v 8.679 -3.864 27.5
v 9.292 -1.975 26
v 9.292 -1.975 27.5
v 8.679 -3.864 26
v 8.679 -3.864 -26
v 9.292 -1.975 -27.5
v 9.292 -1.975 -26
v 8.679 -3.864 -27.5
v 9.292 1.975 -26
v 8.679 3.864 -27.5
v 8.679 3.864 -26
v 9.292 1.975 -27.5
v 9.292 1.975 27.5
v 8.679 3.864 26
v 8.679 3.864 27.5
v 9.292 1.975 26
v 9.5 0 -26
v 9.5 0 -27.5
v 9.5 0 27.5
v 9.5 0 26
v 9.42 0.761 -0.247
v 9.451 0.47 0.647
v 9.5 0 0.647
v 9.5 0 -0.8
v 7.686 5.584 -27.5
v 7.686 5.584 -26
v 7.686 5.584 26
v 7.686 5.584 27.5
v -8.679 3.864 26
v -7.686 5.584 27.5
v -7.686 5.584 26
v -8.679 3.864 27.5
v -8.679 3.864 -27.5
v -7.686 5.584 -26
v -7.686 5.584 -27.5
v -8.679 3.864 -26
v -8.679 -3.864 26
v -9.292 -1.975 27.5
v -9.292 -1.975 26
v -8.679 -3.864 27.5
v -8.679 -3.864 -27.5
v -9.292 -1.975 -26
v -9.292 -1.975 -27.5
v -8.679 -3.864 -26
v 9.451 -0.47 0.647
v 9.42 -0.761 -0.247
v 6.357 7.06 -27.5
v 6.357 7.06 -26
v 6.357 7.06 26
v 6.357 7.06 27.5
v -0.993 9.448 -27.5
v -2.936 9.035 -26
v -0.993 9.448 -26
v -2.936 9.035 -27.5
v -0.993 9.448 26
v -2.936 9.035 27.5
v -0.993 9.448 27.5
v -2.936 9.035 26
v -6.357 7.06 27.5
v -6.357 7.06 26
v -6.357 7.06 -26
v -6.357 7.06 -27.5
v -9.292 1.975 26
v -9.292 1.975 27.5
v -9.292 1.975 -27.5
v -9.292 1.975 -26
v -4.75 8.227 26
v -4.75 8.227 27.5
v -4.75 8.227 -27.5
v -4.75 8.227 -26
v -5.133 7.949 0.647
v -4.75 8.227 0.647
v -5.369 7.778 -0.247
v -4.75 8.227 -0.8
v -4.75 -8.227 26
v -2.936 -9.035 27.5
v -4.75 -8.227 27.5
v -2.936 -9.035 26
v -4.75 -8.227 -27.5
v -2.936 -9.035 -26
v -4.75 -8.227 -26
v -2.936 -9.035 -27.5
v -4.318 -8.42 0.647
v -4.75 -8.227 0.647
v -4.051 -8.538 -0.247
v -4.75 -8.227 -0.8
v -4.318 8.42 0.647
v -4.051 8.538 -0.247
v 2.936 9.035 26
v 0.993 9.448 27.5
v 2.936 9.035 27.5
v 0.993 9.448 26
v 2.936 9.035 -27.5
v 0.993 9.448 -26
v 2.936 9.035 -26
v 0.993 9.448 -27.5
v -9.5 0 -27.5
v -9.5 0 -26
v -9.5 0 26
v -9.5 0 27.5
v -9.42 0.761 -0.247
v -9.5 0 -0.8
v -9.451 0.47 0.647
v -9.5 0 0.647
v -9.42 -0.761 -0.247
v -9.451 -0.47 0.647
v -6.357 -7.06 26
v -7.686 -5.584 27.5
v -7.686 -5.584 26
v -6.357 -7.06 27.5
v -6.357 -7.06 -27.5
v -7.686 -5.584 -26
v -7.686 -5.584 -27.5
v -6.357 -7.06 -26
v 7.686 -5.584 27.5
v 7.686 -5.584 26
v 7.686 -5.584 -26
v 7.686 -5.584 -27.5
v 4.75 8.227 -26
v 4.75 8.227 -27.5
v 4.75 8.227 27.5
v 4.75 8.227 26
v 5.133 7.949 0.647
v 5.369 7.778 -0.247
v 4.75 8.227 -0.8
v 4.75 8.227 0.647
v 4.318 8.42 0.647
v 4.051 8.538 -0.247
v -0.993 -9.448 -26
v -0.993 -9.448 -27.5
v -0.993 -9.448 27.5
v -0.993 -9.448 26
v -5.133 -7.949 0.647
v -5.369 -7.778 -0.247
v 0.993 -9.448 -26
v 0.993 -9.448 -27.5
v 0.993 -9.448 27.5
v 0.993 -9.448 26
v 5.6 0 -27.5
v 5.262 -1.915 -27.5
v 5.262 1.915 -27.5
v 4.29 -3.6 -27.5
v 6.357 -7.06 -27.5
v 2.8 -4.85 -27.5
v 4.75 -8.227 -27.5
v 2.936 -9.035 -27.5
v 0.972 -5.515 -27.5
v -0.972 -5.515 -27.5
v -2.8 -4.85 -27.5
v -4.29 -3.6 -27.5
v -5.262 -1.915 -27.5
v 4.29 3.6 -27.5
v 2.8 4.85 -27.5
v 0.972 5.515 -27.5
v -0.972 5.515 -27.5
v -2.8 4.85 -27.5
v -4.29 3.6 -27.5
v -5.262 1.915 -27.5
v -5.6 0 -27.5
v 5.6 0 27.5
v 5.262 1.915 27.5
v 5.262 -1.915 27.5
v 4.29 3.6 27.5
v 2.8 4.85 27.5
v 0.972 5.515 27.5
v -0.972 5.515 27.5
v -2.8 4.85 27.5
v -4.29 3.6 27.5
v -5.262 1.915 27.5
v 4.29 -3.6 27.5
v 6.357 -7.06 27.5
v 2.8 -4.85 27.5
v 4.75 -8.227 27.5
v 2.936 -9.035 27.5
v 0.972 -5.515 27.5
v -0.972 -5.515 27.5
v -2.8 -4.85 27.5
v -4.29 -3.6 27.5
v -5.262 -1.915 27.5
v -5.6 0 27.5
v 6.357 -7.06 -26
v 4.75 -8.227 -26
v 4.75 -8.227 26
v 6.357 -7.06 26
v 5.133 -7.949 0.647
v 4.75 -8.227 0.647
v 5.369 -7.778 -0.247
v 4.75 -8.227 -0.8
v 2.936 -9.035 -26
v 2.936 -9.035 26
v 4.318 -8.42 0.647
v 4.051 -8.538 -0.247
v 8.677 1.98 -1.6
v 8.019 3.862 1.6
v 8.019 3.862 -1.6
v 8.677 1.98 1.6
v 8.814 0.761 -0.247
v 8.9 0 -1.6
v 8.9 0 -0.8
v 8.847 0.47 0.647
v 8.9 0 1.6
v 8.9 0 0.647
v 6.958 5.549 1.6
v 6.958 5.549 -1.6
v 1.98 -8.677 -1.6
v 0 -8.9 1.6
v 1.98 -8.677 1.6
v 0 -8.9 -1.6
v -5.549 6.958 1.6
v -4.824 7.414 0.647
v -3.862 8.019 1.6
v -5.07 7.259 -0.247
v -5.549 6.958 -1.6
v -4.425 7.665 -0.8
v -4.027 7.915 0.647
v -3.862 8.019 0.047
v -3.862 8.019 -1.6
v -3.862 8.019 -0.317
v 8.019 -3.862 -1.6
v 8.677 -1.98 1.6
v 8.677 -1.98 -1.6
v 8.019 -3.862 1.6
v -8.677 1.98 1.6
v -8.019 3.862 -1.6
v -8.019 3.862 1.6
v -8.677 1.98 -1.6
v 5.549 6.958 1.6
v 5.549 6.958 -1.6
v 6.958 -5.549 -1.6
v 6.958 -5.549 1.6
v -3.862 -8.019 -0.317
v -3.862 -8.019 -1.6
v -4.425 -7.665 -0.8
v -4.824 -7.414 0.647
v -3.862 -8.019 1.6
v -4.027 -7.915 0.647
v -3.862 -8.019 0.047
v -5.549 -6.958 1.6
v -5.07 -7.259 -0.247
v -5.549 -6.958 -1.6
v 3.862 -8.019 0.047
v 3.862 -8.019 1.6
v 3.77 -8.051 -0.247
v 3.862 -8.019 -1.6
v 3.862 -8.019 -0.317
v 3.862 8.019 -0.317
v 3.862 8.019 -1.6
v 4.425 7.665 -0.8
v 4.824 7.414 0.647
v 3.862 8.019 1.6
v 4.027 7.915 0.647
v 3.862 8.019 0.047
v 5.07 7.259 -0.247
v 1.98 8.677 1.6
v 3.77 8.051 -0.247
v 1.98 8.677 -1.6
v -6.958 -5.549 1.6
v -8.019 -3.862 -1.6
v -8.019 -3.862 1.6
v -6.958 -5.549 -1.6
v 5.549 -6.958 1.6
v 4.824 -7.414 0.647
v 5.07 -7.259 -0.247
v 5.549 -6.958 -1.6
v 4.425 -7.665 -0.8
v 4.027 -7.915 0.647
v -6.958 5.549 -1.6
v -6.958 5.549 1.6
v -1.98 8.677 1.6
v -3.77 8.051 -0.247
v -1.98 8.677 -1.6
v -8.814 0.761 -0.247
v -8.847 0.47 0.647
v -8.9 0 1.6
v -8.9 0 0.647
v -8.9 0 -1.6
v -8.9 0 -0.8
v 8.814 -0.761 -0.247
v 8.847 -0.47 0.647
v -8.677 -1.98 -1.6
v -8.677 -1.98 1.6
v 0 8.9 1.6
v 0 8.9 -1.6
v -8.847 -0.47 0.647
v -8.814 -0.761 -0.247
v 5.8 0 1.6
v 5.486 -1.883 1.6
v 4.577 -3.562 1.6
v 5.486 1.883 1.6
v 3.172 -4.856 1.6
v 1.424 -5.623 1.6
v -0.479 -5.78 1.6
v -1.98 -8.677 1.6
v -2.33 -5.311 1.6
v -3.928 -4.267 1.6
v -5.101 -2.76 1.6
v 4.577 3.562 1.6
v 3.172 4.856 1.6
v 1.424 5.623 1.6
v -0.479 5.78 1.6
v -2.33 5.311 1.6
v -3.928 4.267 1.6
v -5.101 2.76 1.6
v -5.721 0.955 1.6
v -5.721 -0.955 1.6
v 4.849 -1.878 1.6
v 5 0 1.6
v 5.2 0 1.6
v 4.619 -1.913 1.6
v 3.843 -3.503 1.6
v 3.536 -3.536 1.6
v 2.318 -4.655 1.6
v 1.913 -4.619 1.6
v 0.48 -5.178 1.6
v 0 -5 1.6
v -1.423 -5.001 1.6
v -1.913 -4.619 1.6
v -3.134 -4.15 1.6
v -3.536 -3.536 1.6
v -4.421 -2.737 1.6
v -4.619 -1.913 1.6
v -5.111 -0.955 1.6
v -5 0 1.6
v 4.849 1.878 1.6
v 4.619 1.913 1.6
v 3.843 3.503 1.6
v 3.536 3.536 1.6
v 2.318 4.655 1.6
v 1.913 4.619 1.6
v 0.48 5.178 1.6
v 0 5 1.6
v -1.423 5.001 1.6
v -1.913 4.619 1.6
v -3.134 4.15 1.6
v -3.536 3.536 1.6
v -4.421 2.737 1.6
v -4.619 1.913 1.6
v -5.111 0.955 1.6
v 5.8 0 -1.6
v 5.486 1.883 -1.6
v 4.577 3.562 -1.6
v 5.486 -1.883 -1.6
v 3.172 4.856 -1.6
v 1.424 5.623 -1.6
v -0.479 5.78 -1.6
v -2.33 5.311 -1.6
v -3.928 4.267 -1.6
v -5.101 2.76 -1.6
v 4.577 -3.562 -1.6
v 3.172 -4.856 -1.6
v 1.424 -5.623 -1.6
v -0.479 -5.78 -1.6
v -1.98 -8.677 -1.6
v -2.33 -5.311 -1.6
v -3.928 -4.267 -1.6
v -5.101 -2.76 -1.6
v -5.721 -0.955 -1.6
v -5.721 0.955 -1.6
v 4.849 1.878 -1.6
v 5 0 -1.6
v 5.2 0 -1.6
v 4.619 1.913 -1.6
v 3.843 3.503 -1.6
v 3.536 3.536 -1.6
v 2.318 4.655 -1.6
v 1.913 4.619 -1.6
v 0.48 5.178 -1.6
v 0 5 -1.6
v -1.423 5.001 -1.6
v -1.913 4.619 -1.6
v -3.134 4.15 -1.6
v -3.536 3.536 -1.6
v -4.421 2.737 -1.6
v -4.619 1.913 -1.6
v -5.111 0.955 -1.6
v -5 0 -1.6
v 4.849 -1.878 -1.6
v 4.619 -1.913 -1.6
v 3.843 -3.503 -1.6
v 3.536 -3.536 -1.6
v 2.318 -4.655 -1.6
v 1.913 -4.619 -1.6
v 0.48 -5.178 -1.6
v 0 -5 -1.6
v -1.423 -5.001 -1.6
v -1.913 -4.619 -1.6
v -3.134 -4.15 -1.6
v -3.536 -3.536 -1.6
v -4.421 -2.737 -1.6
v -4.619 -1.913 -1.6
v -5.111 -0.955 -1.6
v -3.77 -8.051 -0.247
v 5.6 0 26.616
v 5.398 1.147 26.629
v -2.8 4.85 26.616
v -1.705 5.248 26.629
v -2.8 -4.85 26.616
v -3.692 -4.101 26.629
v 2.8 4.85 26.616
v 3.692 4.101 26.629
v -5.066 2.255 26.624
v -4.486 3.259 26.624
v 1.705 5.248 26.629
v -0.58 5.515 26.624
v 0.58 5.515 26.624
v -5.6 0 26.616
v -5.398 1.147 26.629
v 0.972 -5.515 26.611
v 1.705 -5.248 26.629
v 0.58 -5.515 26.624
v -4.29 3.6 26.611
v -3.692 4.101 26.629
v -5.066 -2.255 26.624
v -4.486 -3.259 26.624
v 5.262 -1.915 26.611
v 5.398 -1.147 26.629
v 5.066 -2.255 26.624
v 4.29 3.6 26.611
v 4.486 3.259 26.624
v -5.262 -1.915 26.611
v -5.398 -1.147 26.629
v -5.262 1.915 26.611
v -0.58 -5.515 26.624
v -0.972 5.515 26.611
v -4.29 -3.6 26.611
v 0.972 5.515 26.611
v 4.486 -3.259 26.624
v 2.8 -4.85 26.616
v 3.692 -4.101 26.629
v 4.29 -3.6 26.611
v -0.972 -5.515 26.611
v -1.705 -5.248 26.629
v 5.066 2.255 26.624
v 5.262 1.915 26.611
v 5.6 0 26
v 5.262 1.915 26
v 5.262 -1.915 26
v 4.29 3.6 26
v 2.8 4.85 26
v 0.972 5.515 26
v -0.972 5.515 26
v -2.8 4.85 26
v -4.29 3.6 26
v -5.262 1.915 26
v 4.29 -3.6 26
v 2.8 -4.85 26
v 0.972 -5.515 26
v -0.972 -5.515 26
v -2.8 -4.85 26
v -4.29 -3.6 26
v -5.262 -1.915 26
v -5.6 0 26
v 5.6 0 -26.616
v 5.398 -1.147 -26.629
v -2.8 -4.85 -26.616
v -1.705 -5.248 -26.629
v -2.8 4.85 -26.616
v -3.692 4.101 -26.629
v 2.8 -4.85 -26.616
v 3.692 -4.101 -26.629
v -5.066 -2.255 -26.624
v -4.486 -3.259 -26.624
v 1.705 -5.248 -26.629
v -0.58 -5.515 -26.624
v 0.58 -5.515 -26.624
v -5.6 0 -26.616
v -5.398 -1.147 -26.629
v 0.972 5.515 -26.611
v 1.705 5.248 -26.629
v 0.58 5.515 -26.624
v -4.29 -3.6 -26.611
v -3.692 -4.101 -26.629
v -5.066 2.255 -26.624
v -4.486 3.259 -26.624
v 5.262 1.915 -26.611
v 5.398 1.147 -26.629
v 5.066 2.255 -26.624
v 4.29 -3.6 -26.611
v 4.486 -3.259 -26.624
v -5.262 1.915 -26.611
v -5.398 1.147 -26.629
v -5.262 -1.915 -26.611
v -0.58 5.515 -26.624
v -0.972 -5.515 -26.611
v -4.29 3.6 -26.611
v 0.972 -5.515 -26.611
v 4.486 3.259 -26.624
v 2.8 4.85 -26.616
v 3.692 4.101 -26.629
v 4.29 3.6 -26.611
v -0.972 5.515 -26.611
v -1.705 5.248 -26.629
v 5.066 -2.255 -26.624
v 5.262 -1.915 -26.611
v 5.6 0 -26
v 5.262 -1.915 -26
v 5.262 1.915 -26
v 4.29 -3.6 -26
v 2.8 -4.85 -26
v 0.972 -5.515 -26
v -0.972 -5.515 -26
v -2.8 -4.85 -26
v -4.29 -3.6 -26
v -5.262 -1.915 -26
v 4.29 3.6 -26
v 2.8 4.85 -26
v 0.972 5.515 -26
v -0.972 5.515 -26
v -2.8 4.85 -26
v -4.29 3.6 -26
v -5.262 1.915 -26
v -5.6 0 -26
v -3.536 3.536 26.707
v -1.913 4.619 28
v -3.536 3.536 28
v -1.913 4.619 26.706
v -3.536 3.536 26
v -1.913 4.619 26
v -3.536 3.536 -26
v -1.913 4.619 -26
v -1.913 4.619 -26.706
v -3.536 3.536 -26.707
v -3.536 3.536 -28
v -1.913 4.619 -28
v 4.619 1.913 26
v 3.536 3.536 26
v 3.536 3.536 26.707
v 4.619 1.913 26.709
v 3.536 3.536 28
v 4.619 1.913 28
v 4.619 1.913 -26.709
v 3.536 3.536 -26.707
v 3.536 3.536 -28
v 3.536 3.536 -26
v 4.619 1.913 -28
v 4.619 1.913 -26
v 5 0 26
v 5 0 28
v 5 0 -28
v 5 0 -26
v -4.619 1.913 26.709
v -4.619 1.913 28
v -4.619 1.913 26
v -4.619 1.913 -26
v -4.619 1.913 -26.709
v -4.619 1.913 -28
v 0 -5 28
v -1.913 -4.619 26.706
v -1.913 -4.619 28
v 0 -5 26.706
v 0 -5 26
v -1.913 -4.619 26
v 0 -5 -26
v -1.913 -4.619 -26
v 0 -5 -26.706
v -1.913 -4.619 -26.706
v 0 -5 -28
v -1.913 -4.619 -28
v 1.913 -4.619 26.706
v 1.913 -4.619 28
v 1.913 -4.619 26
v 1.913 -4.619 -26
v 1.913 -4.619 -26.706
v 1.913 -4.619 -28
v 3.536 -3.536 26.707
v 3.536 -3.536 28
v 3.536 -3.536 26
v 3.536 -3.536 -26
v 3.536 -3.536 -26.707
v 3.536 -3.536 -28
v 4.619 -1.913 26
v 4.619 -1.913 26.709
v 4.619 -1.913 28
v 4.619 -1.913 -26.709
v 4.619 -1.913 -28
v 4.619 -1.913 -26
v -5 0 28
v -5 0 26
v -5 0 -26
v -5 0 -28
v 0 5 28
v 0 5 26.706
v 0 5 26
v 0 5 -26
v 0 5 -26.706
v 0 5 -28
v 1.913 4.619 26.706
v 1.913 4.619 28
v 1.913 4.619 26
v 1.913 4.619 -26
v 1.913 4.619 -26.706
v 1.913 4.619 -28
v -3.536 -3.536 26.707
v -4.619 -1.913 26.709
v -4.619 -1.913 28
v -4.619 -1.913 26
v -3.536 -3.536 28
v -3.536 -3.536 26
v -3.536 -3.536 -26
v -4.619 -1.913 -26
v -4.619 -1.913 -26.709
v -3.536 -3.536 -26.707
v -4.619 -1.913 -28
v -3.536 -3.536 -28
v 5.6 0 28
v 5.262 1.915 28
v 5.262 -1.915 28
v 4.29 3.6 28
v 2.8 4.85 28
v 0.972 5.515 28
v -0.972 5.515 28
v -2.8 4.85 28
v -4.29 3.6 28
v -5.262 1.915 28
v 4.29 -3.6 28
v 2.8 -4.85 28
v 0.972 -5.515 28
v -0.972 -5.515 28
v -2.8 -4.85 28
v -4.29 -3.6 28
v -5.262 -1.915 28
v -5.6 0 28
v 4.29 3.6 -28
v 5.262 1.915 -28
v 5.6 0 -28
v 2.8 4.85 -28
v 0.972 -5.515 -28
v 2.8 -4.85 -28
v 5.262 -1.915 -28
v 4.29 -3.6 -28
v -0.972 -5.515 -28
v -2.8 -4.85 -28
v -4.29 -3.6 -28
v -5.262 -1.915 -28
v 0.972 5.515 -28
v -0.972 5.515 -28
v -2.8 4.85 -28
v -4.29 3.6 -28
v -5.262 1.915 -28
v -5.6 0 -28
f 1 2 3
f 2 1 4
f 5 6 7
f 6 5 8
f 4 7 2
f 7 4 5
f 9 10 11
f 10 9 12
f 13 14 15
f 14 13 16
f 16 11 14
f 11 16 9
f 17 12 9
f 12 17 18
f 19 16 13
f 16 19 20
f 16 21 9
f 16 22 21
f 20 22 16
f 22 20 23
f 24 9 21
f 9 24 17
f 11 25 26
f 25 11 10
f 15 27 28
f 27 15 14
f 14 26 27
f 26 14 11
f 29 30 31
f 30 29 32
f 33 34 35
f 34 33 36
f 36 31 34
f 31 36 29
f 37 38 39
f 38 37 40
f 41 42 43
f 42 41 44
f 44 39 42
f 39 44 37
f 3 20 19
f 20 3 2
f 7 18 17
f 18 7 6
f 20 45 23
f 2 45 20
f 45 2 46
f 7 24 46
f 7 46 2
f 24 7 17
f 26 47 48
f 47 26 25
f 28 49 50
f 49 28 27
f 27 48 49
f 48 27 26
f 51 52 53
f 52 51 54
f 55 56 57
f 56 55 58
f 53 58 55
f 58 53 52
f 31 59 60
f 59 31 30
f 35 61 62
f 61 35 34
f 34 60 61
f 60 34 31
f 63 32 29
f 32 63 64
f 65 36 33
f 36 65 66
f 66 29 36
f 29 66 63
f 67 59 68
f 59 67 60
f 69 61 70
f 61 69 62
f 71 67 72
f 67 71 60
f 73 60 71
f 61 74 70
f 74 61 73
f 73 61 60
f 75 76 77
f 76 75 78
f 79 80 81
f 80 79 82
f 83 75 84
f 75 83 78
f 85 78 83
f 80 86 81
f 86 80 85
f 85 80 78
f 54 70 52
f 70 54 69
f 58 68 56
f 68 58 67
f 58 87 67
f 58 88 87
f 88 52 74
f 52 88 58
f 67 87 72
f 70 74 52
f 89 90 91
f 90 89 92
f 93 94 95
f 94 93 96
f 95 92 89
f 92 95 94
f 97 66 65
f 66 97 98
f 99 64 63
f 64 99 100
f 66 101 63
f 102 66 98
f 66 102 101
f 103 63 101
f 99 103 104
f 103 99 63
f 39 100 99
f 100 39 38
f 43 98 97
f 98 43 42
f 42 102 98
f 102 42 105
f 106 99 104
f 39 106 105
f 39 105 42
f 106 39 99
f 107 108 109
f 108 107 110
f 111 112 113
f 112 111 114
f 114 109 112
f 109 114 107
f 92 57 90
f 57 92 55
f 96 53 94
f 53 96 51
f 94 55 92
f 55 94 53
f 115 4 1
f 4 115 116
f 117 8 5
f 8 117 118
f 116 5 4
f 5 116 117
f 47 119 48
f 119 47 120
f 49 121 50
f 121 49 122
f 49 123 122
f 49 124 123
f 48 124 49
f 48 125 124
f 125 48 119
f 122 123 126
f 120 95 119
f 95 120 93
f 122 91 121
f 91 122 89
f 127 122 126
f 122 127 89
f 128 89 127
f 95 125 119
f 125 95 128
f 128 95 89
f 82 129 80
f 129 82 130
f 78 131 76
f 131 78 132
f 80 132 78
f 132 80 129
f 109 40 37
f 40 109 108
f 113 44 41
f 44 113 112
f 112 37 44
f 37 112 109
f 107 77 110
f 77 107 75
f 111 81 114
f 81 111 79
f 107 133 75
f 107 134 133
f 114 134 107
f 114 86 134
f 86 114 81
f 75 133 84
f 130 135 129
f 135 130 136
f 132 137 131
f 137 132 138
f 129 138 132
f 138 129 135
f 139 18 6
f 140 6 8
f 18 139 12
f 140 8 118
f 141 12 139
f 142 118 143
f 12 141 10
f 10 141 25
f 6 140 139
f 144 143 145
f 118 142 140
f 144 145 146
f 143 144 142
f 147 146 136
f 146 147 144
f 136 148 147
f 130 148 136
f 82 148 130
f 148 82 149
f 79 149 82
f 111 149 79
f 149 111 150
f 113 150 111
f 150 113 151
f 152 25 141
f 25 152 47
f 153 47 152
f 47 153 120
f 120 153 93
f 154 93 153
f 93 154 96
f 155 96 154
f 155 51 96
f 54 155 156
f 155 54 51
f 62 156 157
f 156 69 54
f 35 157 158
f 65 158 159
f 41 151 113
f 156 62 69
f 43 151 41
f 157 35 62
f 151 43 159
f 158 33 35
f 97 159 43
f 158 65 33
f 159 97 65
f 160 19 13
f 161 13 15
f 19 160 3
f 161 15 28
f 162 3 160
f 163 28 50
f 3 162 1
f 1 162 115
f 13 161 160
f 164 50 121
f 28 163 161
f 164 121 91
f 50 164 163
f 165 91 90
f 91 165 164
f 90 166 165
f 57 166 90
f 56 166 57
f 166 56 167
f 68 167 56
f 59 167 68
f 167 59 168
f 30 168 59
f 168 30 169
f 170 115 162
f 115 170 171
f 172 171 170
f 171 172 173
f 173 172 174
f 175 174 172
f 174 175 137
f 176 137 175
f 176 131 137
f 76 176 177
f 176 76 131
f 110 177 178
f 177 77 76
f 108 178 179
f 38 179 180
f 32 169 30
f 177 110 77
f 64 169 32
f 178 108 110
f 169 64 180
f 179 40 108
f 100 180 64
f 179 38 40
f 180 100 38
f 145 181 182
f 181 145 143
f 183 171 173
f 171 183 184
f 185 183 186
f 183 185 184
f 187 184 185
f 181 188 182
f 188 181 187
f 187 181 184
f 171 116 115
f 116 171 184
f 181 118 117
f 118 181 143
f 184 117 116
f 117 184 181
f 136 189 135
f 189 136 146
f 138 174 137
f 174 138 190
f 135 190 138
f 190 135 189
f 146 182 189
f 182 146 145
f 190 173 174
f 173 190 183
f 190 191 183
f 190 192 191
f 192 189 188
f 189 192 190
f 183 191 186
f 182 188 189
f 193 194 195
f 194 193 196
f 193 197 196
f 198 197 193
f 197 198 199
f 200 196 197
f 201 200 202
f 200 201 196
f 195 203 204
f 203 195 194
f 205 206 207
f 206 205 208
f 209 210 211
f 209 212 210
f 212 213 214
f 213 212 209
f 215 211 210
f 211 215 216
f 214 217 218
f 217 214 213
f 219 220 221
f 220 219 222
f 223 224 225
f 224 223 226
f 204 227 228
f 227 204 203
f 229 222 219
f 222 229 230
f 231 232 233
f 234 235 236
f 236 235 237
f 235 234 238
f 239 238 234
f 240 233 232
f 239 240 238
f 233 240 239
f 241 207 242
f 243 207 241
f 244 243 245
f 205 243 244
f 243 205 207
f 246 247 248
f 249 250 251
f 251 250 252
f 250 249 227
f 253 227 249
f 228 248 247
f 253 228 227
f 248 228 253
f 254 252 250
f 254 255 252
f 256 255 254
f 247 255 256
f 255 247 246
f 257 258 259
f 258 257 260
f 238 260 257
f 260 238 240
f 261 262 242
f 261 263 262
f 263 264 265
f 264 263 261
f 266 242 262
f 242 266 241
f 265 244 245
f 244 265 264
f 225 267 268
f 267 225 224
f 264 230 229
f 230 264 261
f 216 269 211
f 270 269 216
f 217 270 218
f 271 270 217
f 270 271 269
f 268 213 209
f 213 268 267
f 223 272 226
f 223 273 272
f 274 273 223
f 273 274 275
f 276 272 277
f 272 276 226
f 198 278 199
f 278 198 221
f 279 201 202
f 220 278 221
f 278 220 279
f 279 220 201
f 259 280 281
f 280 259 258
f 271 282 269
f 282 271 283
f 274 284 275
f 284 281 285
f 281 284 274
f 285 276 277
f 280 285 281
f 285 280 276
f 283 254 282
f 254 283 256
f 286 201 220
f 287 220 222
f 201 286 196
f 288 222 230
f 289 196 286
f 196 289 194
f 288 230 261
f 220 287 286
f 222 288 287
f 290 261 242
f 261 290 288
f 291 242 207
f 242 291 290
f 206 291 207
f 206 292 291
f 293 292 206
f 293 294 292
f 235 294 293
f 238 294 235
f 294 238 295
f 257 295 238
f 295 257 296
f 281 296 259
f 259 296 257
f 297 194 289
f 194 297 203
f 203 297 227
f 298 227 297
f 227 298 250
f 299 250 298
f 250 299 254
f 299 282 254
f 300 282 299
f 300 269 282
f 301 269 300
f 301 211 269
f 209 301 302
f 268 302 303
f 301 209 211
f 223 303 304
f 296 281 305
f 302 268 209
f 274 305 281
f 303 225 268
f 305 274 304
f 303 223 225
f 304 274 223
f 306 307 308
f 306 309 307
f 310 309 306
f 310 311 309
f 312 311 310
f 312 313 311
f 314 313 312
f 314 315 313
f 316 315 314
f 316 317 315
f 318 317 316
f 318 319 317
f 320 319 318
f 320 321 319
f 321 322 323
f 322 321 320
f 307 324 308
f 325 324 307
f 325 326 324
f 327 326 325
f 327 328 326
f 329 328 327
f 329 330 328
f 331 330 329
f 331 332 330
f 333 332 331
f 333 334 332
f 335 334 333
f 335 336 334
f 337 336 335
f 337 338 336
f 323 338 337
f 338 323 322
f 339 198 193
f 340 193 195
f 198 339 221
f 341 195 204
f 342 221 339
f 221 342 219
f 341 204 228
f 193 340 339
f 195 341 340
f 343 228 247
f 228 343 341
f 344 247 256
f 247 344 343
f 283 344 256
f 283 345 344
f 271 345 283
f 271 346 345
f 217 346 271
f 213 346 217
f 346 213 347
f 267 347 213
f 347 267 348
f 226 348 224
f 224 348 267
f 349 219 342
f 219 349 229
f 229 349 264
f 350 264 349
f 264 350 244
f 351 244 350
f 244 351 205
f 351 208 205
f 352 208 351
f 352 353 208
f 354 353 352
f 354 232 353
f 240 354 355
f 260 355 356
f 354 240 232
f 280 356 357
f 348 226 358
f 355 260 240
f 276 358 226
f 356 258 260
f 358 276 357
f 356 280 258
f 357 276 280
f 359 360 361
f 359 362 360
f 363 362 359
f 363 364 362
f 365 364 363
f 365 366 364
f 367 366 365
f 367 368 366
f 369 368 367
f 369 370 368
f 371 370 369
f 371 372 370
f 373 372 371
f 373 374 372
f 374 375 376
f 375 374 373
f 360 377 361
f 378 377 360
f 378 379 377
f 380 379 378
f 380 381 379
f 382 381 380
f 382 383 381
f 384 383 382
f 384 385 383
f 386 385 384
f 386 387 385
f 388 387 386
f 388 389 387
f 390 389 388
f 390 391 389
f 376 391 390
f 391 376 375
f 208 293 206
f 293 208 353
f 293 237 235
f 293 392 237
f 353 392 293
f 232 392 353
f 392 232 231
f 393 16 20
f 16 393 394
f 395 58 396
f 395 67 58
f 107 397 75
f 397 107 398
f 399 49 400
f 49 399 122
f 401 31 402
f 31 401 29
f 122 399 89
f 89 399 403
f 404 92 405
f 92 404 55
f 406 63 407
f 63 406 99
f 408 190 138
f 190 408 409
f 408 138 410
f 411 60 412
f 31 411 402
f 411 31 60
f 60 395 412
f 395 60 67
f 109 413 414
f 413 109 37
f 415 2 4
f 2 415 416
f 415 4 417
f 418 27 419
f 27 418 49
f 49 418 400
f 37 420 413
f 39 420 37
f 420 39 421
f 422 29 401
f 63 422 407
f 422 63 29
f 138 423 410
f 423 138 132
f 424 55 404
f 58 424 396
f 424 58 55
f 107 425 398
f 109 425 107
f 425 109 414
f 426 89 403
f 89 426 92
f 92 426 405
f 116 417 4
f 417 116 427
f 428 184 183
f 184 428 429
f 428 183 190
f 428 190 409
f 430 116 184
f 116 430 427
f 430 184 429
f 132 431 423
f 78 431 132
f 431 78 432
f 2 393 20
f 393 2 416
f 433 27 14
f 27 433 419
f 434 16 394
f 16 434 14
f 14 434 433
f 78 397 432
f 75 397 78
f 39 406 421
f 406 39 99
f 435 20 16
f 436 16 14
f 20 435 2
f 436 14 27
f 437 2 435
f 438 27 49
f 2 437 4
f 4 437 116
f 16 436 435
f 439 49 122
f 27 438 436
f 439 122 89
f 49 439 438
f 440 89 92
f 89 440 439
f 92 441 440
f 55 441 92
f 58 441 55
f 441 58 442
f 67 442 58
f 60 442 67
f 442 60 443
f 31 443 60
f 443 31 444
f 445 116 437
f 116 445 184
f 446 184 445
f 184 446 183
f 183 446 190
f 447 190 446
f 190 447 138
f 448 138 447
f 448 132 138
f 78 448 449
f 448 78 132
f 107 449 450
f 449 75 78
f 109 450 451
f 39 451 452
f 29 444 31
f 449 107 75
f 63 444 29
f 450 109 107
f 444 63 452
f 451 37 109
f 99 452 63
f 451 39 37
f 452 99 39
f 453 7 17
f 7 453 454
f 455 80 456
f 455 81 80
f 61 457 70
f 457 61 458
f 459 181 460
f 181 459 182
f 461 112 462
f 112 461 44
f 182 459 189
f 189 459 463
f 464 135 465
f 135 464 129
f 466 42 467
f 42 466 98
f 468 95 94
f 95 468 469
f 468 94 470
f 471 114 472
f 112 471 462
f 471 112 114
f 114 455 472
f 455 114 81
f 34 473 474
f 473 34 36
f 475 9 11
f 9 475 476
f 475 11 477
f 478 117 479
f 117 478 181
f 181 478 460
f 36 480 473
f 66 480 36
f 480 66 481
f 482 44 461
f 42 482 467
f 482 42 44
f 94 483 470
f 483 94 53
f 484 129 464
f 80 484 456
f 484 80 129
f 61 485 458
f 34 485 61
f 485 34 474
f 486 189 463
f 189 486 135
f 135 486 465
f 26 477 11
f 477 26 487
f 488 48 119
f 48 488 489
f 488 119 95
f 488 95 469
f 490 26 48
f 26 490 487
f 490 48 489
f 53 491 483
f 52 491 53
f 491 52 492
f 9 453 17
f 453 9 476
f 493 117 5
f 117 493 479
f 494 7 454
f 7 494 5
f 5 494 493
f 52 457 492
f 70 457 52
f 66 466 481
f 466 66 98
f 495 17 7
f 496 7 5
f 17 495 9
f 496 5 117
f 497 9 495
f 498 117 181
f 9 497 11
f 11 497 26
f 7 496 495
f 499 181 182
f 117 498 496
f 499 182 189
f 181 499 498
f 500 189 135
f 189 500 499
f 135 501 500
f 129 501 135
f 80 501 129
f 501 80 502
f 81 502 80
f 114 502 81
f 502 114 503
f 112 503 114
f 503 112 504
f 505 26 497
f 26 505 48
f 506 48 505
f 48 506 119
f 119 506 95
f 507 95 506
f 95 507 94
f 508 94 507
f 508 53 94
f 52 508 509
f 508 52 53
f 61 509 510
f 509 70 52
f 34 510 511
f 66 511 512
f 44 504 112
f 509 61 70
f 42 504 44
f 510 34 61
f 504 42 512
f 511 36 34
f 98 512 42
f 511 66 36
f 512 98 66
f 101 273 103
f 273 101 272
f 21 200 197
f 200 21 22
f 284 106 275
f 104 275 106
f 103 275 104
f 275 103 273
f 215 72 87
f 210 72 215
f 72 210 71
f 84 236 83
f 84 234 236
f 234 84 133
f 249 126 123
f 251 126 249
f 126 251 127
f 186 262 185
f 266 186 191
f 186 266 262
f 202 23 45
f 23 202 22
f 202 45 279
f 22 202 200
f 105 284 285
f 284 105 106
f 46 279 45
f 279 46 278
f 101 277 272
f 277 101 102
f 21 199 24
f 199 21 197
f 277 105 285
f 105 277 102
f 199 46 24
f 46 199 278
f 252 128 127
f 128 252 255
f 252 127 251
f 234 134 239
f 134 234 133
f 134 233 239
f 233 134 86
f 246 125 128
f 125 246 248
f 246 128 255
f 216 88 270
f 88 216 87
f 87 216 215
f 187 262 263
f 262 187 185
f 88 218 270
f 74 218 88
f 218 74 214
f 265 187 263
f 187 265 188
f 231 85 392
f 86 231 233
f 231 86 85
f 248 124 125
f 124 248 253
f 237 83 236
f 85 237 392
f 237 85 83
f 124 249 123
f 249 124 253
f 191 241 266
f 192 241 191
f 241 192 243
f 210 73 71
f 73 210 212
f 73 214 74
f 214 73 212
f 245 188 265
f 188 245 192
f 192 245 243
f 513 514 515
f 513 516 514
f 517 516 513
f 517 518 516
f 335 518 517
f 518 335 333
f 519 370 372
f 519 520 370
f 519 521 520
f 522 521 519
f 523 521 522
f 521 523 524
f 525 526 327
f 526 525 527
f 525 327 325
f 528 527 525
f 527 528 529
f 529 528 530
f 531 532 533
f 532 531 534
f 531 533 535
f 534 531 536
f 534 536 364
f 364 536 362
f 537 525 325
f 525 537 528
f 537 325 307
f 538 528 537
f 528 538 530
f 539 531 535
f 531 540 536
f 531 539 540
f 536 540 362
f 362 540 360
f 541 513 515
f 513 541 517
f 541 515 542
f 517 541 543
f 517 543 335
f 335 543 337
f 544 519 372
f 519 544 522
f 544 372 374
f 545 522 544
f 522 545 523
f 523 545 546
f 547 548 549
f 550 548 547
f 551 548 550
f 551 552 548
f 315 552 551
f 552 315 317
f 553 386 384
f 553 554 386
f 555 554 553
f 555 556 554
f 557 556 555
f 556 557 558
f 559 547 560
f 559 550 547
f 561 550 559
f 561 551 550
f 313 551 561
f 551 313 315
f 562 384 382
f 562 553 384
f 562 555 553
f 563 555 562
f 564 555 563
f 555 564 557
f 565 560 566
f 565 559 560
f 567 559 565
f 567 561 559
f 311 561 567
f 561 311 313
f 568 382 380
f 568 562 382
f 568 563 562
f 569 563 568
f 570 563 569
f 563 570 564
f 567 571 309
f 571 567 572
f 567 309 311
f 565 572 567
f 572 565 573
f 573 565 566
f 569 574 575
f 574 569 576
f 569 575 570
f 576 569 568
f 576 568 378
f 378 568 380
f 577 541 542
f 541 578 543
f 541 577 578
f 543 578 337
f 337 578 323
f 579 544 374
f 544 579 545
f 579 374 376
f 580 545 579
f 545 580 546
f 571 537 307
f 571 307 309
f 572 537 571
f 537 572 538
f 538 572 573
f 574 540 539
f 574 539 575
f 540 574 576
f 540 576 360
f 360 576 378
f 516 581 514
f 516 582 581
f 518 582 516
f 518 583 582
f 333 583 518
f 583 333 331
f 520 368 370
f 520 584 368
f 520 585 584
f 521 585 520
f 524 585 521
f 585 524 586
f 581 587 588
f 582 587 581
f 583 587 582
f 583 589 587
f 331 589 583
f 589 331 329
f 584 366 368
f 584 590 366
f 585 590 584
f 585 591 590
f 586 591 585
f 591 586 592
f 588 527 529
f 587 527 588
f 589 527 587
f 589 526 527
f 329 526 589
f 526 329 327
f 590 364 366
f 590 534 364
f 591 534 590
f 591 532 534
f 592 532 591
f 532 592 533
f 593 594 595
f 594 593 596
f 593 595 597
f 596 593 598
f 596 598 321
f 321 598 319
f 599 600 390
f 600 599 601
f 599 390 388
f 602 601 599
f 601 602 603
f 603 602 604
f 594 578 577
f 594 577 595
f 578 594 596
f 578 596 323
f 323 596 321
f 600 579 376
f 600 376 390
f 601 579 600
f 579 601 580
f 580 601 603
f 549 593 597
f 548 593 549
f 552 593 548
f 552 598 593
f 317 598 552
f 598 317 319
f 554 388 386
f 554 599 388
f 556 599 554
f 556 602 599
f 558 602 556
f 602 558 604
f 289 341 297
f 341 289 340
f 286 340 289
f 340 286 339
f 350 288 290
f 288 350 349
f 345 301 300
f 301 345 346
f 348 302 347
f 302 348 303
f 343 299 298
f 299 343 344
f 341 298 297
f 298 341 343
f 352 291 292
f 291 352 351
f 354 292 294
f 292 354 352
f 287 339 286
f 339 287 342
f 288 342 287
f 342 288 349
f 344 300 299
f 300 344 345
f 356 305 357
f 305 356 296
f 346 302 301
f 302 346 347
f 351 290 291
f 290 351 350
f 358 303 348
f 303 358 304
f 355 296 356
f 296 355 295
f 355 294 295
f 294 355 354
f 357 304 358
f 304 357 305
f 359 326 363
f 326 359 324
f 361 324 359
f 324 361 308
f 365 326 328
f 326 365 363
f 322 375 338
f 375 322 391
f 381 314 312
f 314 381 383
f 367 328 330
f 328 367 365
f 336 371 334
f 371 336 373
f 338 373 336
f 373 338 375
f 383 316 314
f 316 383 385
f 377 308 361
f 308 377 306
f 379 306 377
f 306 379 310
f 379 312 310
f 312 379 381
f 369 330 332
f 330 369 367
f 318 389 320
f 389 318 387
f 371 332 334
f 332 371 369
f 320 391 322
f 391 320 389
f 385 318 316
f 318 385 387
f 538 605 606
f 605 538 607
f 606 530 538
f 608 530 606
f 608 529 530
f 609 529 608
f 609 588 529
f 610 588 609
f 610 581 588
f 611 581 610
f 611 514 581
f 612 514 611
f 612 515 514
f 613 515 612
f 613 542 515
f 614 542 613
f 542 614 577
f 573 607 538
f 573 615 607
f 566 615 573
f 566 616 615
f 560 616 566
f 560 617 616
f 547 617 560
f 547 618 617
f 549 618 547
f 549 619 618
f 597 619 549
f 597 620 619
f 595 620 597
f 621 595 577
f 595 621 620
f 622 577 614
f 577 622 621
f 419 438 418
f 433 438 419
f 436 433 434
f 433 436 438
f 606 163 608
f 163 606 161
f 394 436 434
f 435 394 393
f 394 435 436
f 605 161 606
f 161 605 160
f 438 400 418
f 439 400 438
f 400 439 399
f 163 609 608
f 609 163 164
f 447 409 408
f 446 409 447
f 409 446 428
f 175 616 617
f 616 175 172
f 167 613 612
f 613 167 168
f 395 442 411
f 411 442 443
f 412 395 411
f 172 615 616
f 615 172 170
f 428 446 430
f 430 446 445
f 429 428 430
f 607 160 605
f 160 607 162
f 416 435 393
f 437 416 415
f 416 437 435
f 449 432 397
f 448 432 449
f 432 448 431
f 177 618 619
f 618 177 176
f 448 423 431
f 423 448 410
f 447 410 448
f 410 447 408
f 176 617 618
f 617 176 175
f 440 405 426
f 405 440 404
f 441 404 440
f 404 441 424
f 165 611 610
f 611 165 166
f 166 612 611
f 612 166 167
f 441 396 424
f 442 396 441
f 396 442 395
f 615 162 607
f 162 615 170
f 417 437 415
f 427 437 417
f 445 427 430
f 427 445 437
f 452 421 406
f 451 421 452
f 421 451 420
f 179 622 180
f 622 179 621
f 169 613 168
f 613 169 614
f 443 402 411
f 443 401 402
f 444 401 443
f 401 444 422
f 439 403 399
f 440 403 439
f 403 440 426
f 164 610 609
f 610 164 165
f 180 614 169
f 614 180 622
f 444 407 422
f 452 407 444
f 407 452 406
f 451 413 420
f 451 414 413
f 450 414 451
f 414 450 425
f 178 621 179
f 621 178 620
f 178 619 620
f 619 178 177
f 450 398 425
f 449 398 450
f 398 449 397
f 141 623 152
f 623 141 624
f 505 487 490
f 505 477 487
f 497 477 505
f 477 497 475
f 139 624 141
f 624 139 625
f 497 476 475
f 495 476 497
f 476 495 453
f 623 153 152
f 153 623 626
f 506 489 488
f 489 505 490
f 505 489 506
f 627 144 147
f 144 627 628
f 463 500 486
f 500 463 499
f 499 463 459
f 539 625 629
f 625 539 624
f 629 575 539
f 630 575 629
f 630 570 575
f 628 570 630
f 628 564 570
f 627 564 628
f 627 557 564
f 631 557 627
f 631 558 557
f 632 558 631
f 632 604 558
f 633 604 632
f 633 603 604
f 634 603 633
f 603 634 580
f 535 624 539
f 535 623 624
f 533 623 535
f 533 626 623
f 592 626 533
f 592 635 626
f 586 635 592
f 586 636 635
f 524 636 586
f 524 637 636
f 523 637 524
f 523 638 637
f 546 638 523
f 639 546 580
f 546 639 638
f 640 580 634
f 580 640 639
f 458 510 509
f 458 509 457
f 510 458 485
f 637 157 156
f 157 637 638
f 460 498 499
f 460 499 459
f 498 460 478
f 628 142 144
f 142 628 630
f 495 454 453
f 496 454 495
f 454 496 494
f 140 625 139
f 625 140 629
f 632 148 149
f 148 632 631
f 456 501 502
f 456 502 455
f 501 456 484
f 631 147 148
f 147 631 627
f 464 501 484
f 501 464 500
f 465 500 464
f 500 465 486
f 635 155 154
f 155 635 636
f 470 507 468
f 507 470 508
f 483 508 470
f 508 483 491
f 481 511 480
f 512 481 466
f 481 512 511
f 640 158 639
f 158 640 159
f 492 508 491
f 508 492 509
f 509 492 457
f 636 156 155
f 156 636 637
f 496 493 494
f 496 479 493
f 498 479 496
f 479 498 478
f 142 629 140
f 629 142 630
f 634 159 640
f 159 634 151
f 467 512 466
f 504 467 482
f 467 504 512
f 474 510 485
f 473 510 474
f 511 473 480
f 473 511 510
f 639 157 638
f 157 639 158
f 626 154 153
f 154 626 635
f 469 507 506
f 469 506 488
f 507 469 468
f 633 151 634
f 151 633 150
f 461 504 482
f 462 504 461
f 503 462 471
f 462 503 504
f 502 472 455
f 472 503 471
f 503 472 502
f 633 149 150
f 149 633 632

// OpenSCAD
// Parameters
bearing_L = 55.0; //[27.5:110.0:0.5]
bearing_OD = 19.0; //[9.5:38.0:0.1]
bearing_ID = 10.0; //[5.0:20.0:0.1]
chamfer = 0.5; //[0.25:2.0:0.05]
overlap = 1.0; //[0.5:2.0:0.1]
track_count = 6; //[4:10:1]
track_radius = 0.8; //[0.4:1.6:0.05]
track_depth_offset = 1.2; //[0.6:2.4:0.1]
cage_thickness = 0.8; //[0.4:1.6:0.05]
cage_length = 45.0; //[20.0:100.0:0.5]
seal_lip_length = 2.0; //[1.0:5.0:0.1]
seal_lip_radial = 0.6; //[0.3:1.5:0.05]
lube_groove_width = 1.2; //[0.6:3.0:0.1]
lube_groove_depth = 0.6; //[0.3:1.5:0.05]

// Base Shapes
module outer_cylinder_body() {
  cylinder(h=bearing_L, r=bearing_OD/2, center=true);
}

module through_bore() {
  cylinder(h=bearing_L + 2*overlap, r=bearing_ID/2, center=true);
}

module end_face_chamfer_pos() {
  translate([0, 0, bearing_L/2 - (chamfer + overlap)/2])
    cylinder(h=chamfer + overlap, r1=bearing_OD/2, r2=0, center=true);
}

module end_face_chamfer_neg() {
  translate([0, 0, -bearing_L/2 + (chamfer + overlap)/2])
    rotate([180, 0, 0])
    cylinder(h=chamfer + overlap, r1=bearing_OD/2, r2=0, center=true);
}

module ball_track(i) {
  angle = 360/track_count * i;
  x = (bearing_OD/2 - track_depth_offset) * cos(angle);
  y = (bearing_OD/2 - track_depth_offset) * sin(angle);
  translate([x, y, 0])
    rotate([0, 90, angle])
    cylinder(h=bearing_L + 2*overlap, r=track_radius, center=true);
}

module retainer_cage_outer() {
  cylinder(h=cage_length, r=bearing_ID/2 + cage_thickness, center=true);
}

module retainer_cage_inner() {
  cylinder(h=cage_length + 2*overlap, r=bearing_ID/2 + overlap*0.2, center=true);
}

module seal_lip_pos_outer() {
  translate([0, 0, bearing_L/2 - seal_lip_length/2 + overlap*0.5])
    cylinder(h=seal_lip_length, r=bearing_ID/2 + seal_lip_radial, center=true);
}

module seal_lip_pos_inner() {
  translate([0, 0, bearing_L/2 - seal_lip_length/2 + overlap*0.5])
    cylinder(h=seal_lip_length + 2*overlap, r=bearing_ID/2, center=true);
}

module seal_lip_neg_outer() {
  translate([0, 0, -bearing_L/2 + seal_lip_length/2 - overlap*0.5])
    cylinder(h=seal_lip_length, r=bearing_ID/2 + seal_lip_radial, center=true);
}

module seal_lip_neg_inner() {
  translate([0, 0, -bearing_L/2 + seal_lip_length/2 - overlap*0.5])
    cylinder(h=seal_lip_length + 2*overlap, r=bearing_ID/2, center=true);
}

module lubrication_groove_cutter() {
  cylinder(h=lube_groove_width + 2*overlap, r=bearing_OD/2 - lube_groove_depth, center=true);
}

// Operations
module retainer_cage_detail() {
  difference() {
    retainer_cage_outer();
    retainer_cage_inner();
  }
}

module seal_lip_pos() {
  difference() {
    seal_lip_pos_outer();
    seal_lip_pos_inner();
  }
}

module seal_lip_neg() {
  difference() {
    seal_lip_neg_outer();
    seal_lip_neg_inner();
  }
}

module seal_lips() {
  union() {
    seal_lip_pos();
    seal_lip_neg();
  }
}

module bearing_outer_with_lube_groove() {
  difference() {
    outer_cylinder_body();
    lubrication_groove_cutter();
  }
}

module bearing_outer_with_chamfers() {
  difference() {
    bearing_outer_with_lube_groove();
    end_face_chamfer_pos();
    end_face_chamfer_neg();
  }
}

module bearing_outer_with_tracks() {
  difference() {
    bearing_outer_with_chamfers();
    for (i = [0:track_count-1]) {
      ball_track(i);
    }
  }
}

module bearing_sleeve_hollow() {
  difference() {
    bearing_outer_with_tracks();
    through_bore();
  }
}

module bearing_complete_union() {
  union() {
    bearing_sleeve_hollow();
    retainer_cage_detail();
    seal_lips();
  }
}

// Final Output
color("Silver") bearing_complete_union();
